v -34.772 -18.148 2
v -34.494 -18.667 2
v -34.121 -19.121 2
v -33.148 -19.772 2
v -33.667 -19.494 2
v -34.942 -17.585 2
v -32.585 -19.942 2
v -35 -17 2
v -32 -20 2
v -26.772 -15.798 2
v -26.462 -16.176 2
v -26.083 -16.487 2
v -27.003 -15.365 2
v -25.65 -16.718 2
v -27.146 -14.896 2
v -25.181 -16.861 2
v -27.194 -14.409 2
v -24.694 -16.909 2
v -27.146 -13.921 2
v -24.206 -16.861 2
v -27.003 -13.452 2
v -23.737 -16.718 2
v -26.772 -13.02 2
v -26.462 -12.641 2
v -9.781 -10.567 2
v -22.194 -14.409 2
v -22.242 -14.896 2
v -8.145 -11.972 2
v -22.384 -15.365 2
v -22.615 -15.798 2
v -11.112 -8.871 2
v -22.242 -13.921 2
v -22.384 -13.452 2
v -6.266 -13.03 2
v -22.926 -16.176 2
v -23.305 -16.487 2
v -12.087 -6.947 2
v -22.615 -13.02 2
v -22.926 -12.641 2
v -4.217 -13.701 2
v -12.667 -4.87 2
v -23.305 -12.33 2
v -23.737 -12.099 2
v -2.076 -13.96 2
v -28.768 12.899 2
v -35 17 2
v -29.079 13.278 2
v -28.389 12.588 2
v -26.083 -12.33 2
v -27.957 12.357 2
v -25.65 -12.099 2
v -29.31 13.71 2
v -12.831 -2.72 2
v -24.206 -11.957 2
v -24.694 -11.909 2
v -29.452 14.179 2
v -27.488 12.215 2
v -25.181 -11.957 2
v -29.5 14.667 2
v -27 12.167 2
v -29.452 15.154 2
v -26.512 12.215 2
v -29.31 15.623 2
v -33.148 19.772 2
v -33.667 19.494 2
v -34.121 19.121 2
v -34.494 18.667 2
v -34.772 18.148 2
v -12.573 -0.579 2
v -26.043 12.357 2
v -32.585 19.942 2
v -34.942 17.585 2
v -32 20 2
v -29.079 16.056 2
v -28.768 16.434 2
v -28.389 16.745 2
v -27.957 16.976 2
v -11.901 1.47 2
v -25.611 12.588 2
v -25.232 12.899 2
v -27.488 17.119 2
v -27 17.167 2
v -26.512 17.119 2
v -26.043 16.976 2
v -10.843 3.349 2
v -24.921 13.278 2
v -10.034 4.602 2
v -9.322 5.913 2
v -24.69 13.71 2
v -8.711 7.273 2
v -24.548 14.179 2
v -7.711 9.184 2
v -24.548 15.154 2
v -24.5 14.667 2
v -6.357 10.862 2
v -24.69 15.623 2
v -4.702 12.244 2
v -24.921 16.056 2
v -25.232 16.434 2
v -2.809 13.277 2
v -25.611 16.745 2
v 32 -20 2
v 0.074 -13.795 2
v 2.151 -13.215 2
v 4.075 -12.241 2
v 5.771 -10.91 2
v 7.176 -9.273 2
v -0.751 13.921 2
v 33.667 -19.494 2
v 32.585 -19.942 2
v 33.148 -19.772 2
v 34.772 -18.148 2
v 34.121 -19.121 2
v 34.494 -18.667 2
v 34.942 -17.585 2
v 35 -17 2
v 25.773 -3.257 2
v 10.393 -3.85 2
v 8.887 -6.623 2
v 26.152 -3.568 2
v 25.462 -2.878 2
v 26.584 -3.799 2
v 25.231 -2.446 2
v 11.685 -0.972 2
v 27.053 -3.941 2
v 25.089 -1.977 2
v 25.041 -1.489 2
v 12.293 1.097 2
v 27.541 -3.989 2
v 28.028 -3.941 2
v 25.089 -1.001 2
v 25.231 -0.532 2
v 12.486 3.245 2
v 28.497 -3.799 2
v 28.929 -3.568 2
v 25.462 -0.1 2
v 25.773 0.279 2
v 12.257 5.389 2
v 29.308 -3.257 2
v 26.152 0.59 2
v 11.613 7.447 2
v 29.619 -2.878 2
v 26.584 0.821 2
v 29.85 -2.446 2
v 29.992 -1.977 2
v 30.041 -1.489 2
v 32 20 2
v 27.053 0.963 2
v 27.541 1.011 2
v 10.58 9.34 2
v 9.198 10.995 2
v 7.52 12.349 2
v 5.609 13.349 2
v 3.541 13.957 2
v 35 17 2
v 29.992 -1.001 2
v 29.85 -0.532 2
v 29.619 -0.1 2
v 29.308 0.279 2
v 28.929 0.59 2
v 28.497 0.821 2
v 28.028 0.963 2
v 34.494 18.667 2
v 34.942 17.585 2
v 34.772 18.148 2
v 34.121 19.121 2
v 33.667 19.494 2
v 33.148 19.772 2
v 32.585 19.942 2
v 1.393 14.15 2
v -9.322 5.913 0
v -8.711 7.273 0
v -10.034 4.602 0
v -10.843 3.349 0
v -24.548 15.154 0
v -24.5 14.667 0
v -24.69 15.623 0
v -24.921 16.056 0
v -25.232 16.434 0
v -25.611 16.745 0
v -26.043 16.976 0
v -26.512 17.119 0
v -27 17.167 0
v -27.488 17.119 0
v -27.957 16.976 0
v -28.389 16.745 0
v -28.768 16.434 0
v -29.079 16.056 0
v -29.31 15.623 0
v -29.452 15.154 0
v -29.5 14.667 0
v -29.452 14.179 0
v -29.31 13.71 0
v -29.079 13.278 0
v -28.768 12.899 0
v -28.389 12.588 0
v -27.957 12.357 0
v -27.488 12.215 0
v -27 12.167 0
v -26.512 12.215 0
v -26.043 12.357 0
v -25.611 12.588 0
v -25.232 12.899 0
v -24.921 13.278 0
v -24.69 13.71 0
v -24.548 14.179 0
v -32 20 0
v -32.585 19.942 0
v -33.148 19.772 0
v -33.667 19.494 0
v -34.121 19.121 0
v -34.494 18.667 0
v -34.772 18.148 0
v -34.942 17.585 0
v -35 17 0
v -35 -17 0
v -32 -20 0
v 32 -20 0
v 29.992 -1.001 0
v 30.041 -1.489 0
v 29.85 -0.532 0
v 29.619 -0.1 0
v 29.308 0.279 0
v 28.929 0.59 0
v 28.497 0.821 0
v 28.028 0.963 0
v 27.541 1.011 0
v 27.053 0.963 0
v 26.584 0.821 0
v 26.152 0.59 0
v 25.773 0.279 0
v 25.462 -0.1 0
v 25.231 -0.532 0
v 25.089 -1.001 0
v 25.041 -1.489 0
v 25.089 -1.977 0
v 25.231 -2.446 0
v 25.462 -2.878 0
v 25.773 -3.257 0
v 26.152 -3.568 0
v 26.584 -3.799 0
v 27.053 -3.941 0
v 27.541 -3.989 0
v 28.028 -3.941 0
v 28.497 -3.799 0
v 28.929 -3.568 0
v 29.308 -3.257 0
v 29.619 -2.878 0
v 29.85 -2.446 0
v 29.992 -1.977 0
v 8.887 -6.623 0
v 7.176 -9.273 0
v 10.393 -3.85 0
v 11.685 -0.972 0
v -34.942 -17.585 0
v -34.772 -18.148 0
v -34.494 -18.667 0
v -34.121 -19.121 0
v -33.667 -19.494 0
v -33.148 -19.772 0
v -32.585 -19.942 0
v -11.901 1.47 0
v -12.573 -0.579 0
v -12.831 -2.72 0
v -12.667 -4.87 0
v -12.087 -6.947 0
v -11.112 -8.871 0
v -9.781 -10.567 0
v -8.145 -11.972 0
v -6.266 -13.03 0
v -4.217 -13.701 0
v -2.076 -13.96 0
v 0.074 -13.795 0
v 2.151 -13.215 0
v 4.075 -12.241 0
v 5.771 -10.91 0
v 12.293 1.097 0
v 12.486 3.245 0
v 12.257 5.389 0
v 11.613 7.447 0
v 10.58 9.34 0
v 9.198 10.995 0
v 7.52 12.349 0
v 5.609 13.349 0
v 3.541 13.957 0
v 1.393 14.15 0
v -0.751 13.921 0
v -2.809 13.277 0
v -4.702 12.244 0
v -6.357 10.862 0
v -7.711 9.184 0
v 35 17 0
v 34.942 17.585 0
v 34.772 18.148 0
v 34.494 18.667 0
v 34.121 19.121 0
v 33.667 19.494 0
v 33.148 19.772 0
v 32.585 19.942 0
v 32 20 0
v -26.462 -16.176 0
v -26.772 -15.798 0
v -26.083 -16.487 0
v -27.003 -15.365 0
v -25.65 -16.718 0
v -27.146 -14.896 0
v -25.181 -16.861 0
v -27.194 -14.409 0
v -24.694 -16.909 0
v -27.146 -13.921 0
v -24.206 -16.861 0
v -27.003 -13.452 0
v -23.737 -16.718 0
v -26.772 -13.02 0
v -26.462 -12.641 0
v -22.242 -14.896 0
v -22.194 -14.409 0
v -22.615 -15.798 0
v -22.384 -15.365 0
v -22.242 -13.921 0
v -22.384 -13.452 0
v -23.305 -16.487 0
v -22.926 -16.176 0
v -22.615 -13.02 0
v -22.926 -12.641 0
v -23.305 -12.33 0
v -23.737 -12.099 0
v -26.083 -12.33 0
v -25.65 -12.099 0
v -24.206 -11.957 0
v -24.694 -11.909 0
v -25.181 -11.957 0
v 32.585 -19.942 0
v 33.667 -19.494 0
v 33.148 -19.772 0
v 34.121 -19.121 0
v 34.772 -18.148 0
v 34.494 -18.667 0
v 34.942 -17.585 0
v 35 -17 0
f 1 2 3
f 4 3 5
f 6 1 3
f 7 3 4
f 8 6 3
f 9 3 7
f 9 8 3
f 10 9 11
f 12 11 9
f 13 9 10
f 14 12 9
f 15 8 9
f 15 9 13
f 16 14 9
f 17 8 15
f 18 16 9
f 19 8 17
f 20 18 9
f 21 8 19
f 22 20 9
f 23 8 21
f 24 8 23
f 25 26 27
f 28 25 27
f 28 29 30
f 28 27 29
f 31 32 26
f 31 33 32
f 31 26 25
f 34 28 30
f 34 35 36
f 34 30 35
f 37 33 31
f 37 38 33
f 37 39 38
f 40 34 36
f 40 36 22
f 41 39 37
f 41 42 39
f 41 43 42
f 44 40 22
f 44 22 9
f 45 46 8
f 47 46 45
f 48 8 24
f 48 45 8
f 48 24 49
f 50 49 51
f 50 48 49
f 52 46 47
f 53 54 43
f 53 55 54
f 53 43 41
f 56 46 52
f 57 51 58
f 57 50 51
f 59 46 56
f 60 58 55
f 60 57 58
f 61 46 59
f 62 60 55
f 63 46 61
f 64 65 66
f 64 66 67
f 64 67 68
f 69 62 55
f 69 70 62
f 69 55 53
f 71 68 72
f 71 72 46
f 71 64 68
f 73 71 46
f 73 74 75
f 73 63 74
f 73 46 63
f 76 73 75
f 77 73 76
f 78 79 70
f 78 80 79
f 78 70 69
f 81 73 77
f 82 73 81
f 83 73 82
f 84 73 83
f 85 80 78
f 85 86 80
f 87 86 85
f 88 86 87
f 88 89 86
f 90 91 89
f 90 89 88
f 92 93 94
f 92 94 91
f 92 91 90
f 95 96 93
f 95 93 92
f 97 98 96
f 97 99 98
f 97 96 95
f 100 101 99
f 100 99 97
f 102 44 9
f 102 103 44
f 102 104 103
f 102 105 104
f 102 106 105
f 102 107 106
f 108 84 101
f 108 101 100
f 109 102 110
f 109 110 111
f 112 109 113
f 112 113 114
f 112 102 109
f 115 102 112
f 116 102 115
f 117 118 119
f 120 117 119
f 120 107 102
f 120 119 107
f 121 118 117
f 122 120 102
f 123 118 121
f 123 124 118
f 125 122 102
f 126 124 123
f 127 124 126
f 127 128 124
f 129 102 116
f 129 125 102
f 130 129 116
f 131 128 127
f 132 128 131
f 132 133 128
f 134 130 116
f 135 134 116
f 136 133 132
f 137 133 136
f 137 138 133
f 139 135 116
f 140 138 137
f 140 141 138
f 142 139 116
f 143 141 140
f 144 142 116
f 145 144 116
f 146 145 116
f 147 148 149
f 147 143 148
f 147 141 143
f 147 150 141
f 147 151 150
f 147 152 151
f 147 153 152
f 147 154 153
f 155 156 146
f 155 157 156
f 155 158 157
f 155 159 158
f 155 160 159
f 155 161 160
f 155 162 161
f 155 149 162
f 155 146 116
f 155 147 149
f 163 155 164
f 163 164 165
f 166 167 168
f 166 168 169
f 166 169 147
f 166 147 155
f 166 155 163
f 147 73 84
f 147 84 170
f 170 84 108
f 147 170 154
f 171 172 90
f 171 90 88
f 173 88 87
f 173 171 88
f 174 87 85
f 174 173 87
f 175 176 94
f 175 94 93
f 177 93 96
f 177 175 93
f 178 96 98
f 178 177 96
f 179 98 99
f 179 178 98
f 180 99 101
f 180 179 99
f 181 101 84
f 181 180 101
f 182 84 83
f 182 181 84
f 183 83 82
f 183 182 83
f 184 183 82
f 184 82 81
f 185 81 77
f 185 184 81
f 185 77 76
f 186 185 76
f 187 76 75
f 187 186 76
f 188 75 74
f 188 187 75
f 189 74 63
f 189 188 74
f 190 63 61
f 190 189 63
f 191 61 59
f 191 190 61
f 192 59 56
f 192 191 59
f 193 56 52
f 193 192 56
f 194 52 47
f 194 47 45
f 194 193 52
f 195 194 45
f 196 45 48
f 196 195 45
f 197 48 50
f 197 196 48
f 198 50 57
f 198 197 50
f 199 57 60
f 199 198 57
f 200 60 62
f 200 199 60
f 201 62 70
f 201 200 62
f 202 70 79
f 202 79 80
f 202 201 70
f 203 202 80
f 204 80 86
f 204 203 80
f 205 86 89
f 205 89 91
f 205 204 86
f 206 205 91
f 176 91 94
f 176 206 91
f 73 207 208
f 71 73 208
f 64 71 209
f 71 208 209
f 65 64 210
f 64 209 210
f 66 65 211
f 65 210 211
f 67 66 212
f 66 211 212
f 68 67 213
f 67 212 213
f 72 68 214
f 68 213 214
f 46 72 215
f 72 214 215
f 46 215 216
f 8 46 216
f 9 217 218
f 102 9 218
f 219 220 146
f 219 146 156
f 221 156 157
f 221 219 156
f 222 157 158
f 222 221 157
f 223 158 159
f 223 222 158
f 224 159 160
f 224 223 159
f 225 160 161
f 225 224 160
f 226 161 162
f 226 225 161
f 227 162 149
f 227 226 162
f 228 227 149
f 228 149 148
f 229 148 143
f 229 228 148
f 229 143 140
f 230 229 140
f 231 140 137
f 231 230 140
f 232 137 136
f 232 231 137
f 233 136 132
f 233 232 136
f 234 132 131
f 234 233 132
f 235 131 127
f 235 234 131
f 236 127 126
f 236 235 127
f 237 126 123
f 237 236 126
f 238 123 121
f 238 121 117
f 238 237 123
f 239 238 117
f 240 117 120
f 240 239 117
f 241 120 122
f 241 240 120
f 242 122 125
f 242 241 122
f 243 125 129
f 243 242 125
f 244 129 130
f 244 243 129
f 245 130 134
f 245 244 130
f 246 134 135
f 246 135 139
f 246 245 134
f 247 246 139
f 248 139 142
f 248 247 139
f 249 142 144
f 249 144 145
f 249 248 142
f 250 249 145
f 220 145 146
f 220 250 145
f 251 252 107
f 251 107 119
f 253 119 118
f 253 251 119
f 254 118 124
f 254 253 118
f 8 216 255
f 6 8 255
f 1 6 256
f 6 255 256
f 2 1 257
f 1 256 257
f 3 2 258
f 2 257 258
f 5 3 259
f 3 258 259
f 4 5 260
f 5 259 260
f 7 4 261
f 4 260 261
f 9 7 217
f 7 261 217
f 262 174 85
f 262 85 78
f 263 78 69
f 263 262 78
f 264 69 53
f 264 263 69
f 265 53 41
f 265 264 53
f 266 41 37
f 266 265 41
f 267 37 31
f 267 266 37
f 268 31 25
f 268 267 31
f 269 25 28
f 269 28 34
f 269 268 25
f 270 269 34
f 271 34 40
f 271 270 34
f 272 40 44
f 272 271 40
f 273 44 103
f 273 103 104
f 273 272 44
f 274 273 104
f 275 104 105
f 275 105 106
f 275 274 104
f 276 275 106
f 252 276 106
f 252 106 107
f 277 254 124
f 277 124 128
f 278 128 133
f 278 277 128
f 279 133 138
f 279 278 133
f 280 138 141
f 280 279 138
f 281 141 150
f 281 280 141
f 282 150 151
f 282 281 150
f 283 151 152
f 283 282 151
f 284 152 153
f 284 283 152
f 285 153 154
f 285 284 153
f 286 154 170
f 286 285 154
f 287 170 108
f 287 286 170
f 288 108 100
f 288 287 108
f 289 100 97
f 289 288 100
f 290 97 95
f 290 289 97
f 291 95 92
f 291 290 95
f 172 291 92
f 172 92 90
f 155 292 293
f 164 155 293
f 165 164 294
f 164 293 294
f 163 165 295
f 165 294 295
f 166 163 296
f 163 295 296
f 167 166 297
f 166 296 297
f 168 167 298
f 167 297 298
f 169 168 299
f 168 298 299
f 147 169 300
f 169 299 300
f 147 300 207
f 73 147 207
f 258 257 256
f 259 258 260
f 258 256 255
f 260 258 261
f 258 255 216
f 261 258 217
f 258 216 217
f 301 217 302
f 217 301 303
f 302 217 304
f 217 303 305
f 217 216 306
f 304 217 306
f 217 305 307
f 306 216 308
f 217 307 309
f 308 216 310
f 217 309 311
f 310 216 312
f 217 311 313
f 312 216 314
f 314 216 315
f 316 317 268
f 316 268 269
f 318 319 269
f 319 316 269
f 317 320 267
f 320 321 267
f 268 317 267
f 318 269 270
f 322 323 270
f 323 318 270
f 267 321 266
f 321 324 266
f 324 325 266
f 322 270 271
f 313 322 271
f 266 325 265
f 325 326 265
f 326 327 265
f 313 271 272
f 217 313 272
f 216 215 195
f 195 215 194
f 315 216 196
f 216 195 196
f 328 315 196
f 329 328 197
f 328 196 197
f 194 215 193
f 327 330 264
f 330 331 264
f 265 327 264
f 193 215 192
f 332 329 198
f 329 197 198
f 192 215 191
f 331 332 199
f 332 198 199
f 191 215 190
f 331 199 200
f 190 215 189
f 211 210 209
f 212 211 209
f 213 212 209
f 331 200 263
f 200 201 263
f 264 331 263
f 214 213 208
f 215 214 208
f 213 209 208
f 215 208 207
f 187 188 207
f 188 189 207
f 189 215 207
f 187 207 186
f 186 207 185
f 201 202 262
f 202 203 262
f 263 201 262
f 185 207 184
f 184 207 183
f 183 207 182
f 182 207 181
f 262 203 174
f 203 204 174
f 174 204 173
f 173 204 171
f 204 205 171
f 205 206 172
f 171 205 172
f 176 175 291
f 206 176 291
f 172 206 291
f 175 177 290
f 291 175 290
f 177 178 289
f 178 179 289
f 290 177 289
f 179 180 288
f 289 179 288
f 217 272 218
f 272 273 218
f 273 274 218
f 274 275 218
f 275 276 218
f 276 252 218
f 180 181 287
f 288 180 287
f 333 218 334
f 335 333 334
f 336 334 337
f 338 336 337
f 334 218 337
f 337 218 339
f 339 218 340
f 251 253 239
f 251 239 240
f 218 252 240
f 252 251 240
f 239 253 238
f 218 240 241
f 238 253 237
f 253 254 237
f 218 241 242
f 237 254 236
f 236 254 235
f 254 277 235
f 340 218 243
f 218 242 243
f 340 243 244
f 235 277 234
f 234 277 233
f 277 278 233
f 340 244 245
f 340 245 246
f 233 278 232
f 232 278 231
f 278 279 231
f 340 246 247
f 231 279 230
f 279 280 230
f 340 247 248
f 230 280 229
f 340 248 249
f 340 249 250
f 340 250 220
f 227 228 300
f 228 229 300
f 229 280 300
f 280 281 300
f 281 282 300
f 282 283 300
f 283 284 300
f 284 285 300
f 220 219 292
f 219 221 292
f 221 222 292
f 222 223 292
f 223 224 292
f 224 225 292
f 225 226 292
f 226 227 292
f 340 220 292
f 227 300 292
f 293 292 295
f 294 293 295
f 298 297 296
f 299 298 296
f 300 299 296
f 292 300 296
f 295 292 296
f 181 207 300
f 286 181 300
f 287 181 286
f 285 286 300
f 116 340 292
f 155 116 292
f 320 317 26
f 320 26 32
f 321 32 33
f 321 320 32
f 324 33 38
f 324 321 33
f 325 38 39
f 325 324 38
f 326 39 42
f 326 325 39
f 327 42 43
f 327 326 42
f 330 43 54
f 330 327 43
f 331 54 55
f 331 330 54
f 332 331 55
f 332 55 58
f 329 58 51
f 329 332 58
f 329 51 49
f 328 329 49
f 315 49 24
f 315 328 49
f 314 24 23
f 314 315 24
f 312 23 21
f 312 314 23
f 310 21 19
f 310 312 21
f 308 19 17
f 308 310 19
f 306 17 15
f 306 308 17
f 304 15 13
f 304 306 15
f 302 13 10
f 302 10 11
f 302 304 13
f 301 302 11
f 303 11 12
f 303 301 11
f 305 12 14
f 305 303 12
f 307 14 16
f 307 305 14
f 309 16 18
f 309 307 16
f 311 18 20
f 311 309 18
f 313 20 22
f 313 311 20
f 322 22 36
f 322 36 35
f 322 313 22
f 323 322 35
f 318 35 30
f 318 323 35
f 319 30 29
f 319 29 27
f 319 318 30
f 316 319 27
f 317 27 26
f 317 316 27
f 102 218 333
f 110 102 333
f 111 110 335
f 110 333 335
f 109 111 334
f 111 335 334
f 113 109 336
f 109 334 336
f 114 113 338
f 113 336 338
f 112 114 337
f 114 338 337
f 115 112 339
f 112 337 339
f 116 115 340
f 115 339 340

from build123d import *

# Parameters (mm, degrees)
SZKIC2_R                    = 2.5
DODANIE_WYCI_GNI_CIE3_DEPTH = 2


with BuildPart() as part:
    # Szkic2 → Dodanie-wyciągnięcie3 (new body)
    with BuildSketch(Plane.XY):
        with BuildLine():
            ThreePointArc((-35, -17), (-34.121320344, -19.121320344), (-32, -20))
            Line((-32, -20), (32, -20))
            ThreePointArc((32, -20), (34.121320344, -19.121320344), (35, -17))
            Line((35, -17), (35, 17))
            ThreePointArc((35, 17), (34.121320344, 19.121320344), (32, 20))
            Line((32, 20), (-32, 20))
            ThreePointArc((-32, 20), (-34.121320344, 19.121320344), (-35, 17))
            Line((-35, 17), (-35, -17))
        make_face()
        with Locations((-24.693752651, -14.408678002)):
            Circle(SZKIC2_R, mode=Mode.SUBTRACT)
        with BuildLine():
            ThreePointArc((11.684967283, -0.97190814), (9.665957804, -5.250643745), (7.175560187, -9.273316659))
            ThreePointArc((7.175560187, -9.273316659), (-8.144983036, -11.971641207), (-10.843307584, 3.348902015))
            ThreePointArc((-10.843307584, 3.348902015), (-9.665957804, 5.250643745), (-8.711459473, 7.273440584))
            ThreePointArc((-8.711459473, 7.273440584), (5.609428267, 13.3489796), (11.684967283, -0.97190814))
        make_face(mode=Mode.SUBTRACT)
        with Locations((27.540515543, -1.488970059)):
            Circle(SZKIC2_R, mode=Mode.SUBTRACT)
        with Locations((-27, 14.666666667)):
            Circle(SZKIC2_R, mode=Mode.SUBTRACT)
    extrude(amount=DODANIE_WYCI_GNI_CIE3_DEPTH)


solid = part.part
